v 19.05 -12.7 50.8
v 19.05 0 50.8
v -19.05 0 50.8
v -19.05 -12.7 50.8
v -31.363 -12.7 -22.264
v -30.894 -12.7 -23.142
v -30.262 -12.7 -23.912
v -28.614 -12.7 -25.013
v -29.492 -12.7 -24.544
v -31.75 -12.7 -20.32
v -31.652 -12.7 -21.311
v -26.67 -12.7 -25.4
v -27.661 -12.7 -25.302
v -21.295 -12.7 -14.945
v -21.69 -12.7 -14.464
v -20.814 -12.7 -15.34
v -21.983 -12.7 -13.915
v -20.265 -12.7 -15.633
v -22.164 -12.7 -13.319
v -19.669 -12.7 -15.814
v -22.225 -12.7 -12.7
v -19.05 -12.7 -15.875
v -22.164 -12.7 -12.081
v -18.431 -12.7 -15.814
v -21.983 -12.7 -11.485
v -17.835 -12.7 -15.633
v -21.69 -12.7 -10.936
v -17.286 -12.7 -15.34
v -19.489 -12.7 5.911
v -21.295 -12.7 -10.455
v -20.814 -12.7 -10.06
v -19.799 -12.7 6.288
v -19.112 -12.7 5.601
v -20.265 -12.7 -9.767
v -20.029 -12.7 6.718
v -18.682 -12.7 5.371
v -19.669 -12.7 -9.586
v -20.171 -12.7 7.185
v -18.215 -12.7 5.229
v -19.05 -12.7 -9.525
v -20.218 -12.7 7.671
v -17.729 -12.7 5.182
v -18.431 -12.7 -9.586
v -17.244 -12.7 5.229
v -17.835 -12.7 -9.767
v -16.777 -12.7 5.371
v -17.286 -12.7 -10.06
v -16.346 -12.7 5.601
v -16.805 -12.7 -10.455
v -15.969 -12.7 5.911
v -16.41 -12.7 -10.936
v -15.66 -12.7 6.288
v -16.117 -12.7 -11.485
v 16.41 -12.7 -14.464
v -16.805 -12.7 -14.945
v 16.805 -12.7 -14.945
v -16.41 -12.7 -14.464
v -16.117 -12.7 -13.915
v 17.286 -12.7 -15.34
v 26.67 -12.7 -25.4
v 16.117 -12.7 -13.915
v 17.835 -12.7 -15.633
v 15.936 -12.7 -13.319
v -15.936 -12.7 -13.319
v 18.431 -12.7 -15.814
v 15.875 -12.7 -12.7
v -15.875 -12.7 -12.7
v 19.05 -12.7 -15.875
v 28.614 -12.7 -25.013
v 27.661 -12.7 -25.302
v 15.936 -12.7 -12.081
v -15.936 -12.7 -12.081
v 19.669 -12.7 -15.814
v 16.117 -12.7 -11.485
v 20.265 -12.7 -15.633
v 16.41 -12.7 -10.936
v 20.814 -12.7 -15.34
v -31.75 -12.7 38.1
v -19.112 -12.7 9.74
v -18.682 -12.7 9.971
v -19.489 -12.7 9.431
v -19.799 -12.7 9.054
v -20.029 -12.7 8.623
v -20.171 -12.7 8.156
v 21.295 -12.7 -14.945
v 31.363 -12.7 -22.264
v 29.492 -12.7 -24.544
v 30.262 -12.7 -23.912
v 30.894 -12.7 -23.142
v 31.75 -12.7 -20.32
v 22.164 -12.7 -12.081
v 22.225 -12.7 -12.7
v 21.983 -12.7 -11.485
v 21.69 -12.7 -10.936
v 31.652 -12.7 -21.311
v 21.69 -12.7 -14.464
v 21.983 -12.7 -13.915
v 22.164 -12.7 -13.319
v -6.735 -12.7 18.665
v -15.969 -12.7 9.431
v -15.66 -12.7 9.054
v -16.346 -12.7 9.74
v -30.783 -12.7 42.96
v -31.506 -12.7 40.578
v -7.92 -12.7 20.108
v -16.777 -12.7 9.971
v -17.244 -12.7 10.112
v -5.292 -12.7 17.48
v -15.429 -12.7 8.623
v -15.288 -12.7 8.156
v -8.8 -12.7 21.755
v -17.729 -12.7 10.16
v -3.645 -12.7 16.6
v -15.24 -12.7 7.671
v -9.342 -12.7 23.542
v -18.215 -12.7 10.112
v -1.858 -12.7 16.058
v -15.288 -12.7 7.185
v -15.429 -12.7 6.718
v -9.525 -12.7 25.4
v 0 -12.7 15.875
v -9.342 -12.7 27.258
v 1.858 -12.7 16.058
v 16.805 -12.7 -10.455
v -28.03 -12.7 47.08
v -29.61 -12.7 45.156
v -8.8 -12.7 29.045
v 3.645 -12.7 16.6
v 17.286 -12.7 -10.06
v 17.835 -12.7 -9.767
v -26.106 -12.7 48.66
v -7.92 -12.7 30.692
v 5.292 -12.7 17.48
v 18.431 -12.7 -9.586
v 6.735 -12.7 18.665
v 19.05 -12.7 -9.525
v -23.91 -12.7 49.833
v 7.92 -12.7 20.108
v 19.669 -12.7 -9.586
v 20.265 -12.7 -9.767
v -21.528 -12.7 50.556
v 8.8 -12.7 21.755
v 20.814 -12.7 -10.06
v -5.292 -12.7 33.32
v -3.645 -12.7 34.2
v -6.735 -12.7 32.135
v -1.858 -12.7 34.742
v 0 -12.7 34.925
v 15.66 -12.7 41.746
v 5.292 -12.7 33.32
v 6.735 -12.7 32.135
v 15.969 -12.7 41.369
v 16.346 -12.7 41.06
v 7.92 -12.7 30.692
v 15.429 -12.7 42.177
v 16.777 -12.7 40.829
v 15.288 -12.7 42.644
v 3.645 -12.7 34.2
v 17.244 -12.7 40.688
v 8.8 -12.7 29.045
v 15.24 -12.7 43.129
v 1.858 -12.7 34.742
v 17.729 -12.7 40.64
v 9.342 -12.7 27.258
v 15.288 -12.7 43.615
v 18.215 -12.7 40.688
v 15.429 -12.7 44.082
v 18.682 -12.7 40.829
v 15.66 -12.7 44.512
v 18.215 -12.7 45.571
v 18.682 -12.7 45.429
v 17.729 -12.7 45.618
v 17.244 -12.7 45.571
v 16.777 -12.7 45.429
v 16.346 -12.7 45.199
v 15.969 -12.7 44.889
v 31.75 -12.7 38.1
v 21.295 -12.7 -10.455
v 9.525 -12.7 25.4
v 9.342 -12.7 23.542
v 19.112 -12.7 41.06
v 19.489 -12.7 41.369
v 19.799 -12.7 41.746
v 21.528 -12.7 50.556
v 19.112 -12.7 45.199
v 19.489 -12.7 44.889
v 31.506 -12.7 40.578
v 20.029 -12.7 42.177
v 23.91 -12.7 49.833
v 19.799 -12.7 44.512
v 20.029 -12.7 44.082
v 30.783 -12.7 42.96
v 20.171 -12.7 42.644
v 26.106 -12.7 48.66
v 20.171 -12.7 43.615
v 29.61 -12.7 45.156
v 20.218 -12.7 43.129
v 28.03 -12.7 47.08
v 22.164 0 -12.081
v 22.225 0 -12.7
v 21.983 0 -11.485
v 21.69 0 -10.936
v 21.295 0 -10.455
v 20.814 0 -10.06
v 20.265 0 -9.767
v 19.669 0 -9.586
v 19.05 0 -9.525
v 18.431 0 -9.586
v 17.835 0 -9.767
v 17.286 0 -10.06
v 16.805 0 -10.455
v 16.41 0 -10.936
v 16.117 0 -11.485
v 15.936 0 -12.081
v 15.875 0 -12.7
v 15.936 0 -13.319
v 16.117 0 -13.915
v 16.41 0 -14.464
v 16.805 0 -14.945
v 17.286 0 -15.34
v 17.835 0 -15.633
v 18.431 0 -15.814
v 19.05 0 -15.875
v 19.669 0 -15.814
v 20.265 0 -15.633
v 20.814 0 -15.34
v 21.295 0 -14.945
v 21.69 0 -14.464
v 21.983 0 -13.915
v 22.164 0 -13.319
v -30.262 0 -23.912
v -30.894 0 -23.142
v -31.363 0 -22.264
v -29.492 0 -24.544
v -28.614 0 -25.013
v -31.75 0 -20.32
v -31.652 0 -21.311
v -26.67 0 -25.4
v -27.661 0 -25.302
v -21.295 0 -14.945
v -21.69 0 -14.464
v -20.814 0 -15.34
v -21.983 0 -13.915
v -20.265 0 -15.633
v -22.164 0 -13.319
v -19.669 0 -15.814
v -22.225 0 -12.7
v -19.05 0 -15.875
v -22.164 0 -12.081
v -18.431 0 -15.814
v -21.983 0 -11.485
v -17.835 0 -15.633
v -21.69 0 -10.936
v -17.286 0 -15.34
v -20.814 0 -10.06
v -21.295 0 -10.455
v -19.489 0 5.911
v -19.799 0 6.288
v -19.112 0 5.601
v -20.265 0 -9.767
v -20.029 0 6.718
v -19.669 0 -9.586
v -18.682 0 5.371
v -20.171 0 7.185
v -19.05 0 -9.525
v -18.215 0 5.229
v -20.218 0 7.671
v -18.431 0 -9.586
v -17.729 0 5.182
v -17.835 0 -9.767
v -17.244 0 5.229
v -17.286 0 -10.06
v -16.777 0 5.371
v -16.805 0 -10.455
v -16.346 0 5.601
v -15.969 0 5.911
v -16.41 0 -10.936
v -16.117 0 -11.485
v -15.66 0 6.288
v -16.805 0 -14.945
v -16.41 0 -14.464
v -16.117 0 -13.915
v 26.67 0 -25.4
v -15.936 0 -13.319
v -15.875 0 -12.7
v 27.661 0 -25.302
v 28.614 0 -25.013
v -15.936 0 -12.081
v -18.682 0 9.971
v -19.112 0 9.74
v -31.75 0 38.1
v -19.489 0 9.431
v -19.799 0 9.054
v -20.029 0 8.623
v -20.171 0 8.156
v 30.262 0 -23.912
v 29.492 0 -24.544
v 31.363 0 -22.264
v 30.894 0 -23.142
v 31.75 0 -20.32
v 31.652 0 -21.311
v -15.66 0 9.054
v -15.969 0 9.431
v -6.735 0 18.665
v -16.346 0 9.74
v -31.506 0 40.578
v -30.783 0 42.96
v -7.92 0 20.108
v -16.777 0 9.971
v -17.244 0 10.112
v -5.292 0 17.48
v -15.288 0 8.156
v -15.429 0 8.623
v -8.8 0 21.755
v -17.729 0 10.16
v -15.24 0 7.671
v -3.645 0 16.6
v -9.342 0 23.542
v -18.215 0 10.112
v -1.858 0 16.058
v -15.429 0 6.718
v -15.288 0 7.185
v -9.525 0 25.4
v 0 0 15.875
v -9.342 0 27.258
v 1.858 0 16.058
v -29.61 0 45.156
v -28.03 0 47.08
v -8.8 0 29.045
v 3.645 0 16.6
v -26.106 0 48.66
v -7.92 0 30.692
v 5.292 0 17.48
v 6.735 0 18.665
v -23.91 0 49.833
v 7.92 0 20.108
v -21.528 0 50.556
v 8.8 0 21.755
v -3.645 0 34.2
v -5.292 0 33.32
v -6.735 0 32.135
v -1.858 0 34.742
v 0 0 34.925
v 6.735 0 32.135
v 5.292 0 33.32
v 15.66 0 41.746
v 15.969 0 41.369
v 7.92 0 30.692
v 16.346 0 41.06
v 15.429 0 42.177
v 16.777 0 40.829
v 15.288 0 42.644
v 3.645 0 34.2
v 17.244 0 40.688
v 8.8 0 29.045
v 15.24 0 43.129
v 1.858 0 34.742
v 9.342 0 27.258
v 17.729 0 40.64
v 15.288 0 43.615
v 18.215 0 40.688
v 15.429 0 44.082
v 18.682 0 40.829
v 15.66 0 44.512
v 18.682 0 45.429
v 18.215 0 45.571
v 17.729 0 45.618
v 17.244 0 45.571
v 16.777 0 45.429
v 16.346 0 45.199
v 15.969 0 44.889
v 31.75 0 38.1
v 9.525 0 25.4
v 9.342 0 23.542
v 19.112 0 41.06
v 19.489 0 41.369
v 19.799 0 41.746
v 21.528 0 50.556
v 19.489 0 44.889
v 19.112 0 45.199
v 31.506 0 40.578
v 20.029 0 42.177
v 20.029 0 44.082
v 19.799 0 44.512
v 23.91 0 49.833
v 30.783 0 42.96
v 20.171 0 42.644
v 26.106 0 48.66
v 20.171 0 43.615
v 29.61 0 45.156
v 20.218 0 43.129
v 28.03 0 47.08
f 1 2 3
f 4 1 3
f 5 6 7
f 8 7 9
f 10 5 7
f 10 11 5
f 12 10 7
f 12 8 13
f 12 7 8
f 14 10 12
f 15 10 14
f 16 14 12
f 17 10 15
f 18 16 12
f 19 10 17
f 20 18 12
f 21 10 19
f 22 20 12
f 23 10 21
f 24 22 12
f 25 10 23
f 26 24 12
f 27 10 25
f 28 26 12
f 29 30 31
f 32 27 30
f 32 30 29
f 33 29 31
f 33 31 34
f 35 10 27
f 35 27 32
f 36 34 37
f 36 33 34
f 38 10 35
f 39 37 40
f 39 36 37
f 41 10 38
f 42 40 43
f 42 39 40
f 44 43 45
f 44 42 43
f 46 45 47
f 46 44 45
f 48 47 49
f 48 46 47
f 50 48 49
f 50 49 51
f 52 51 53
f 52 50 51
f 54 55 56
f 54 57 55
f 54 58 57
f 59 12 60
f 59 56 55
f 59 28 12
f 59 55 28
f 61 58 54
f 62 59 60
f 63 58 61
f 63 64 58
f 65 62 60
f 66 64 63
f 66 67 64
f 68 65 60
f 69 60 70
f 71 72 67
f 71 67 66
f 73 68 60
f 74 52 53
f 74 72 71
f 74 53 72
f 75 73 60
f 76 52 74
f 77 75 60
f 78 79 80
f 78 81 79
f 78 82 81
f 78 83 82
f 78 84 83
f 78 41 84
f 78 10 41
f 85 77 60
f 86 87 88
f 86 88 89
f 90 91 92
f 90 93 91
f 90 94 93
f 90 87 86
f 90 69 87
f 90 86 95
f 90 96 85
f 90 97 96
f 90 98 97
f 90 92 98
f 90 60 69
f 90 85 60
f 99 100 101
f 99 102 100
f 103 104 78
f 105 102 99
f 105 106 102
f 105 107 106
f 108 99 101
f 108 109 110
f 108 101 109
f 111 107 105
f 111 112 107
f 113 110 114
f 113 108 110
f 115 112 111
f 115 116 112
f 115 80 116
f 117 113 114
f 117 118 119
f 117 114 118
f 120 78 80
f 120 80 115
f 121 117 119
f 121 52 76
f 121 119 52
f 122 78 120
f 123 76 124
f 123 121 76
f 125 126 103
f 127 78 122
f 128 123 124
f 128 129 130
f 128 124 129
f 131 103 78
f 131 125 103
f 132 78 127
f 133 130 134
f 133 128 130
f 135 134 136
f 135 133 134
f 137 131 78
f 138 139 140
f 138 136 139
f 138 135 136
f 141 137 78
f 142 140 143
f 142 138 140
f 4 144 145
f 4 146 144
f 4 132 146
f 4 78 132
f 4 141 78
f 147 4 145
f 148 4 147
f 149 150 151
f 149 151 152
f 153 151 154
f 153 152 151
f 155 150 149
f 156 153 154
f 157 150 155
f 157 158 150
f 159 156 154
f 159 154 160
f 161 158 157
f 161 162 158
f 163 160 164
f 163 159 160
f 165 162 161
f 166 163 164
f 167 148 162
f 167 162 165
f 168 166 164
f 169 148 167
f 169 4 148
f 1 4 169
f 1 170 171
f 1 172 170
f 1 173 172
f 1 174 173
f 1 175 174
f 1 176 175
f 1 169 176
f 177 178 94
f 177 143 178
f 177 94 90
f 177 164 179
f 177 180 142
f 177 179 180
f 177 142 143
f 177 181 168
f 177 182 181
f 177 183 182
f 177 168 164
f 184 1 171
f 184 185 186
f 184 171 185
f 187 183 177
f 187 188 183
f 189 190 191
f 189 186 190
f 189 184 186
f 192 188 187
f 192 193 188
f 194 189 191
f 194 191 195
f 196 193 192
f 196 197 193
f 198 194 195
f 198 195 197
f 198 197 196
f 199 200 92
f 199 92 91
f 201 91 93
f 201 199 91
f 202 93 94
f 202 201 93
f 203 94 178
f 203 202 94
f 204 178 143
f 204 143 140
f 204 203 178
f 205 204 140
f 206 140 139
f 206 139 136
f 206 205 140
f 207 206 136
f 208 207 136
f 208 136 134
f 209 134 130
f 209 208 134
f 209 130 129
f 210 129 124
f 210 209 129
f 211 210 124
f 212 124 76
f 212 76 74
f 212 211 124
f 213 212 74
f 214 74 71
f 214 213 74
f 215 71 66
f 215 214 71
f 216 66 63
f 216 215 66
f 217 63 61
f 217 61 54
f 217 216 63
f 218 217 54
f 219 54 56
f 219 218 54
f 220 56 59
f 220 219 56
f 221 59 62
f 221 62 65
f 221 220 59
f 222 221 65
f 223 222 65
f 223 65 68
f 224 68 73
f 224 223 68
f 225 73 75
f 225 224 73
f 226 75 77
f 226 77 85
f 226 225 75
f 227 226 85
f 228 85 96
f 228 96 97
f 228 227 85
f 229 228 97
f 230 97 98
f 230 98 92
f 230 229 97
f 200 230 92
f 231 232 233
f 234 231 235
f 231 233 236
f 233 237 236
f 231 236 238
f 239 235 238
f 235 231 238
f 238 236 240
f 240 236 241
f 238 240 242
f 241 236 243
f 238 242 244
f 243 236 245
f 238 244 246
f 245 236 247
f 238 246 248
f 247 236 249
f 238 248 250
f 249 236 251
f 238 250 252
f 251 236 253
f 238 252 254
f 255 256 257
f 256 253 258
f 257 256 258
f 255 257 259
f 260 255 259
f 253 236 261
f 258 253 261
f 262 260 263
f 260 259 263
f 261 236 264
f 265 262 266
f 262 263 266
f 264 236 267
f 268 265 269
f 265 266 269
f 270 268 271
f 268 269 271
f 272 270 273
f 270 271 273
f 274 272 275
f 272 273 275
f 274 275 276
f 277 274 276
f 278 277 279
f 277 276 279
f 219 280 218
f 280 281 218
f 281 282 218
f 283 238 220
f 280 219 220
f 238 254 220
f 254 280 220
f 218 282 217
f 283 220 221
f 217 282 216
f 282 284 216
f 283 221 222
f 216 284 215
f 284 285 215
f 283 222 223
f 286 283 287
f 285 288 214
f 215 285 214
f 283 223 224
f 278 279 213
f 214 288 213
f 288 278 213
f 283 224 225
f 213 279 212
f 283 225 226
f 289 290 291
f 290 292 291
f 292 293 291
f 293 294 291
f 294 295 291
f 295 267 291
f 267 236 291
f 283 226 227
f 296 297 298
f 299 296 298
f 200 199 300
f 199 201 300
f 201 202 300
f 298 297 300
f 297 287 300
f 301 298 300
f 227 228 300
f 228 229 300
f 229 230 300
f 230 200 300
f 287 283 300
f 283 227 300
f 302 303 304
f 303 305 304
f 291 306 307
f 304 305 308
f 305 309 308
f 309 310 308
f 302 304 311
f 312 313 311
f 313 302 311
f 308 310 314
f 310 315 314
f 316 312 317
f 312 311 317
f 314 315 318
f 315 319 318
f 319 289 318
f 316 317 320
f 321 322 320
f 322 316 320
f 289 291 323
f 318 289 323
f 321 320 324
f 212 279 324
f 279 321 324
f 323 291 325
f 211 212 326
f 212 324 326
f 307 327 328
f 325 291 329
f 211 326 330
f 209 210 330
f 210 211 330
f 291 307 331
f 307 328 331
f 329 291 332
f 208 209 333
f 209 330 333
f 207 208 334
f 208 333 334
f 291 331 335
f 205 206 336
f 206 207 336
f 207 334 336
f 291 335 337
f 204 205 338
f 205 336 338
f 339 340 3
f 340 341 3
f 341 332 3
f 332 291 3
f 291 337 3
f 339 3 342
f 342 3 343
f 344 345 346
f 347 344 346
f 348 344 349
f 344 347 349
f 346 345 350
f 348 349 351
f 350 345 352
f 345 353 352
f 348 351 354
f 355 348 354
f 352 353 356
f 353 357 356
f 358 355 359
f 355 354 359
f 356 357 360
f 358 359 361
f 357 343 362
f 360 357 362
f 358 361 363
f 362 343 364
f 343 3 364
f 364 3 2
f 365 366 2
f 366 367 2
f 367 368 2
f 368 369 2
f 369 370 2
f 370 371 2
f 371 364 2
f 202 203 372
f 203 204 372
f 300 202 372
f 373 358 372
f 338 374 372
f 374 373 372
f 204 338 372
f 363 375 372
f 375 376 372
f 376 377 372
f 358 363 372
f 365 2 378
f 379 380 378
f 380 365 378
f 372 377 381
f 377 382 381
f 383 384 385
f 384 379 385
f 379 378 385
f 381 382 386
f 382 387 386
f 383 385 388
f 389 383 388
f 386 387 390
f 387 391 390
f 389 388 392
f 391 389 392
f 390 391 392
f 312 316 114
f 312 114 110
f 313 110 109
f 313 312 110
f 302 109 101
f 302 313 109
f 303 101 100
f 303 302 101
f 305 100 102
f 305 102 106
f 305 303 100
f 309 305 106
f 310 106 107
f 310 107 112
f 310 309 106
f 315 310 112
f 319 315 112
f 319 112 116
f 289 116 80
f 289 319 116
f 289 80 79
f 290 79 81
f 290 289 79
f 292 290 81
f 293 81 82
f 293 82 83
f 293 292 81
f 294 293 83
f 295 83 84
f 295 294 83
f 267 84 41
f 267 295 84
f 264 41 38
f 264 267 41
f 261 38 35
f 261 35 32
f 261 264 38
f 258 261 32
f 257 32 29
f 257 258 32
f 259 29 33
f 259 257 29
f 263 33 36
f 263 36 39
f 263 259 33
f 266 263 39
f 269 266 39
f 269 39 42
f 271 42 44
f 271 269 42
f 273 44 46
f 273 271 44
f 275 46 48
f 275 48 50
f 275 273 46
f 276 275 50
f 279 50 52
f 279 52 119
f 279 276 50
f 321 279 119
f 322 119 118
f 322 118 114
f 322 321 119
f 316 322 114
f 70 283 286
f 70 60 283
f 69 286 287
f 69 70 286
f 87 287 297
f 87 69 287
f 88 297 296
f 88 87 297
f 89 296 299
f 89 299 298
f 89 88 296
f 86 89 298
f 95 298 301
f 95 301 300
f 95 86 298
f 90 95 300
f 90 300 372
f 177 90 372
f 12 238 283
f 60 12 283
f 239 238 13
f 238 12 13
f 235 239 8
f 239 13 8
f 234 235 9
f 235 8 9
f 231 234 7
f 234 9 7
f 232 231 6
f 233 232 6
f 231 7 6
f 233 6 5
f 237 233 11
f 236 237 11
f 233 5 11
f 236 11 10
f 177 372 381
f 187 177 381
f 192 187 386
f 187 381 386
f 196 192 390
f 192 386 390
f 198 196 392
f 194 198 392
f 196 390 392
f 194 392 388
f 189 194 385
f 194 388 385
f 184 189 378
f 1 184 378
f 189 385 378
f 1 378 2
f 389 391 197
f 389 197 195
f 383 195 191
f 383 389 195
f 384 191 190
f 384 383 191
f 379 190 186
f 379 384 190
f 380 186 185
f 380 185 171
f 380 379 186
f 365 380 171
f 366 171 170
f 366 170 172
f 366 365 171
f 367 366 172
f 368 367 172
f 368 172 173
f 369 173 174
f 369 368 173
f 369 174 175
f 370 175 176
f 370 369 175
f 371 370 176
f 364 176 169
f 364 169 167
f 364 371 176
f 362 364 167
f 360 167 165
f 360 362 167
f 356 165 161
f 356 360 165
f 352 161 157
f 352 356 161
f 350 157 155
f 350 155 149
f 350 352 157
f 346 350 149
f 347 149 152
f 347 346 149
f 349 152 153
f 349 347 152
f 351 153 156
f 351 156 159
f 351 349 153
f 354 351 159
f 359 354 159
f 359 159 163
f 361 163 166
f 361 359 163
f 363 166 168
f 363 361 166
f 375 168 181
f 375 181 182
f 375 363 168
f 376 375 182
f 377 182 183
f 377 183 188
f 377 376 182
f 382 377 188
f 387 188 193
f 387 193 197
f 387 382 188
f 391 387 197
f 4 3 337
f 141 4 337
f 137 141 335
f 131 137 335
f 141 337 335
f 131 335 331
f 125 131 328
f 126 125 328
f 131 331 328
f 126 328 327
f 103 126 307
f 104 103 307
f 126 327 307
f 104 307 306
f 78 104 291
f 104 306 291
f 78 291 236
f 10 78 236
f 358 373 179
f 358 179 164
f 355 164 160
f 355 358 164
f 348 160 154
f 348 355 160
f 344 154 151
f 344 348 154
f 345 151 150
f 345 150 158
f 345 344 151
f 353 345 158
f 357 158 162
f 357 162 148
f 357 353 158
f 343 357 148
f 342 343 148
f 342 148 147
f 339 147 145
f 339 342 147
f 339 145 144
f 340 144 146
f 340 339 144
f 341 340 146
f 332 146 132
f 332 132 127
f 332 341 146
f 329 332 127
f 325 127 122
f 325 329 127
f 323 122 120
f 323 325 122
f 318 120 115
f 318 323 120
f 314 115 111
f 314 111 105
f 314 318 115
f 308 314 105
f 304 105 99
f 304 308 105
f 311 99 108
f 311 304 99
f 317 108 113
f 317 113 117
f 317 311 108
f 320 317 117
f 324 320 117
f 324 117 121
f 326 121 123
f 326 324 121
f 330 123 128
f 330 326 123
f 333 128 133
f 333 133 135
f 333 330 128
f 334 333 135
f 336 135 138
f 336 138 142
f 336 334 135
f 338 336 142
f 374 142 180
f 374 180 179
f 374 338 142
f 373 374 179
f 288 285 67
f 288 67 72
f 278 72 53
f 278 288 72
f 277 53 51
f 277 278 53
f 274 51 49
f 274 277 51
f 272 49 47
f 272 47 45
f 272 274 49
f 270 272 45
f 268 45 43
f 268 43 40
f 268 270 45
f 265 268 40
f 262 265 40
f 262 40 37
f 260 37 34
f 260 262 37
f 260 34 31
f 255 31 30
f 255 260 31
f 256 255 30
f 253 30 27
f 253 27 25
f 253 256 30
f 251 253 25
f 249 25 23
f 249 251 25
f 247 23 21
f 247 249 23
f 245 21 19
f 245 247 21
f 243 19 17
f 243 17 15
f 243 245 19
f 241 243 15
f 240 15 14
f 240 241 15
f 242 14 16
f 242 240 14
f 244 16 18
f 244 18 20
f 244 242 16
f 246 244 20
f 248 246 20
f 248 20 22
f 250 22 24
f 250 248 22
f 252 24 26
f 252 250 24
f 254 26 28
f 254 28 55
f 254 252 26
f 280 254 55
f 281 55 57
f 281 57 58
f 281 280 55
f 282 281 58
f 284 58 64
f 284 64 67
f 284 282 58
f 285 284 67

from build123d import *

# Parameters (mm, degrees)
F0_R     = 3.175
F0_R_2   = 2.4892
F0_R_3   = 9.525
F1_DEPTH = 12.7
F2_R     = 5.08


with BuildPart() as f1:
    # F0 (on Front) → F1 (new body)
    with BuildSketch(Plane.XZ):
        with BuildLine():
            Line((-31.75, -25.4), (31.75, -25.4))
            Line((31.75, -25.4), (31.75, 38.1))
            ThreePointArc((31.75, 38.1), (28.0302561211, 47.0802561211), (19.05, 50.8))
            Line((19.05, 50.8), (-19.05, 50.8))
            ThreePointArc((-19.05, 50.8), (-28.0302561211, 47.0802561211), (-31.75, 38.1))
            Line((-31.75, 38.1), (-31.75, -25.4))
        make_face()
        with Locations((-19.05, -12.7)):
            Circle(F0_R, mode=Mode.SUBTRACT)
        with Locations((-17.7292, 7.6708)):
            Circle(F0_R_2, mode=Mode.SUBTRACT)
        with Locations((19.05, -12.7)):
            Circle(F0_R, mode=Mode.SUBTRACT)
        with Locations((0, 25.4)):
            Circle(F0_R_3, mode=Mode.SUBTRACT)
        with Locations((17.7292, 43.1292)):
            Circle(F0_R_2, mode=Mode.SUBTRACT)
    extrude(amount=F1_DEPTH)

    # F2
    f2_edges = [f1.edges().sort_by_distance(p)[0] for p in [
        (31.75, -6.35, -25.4),
        (-31.75, -6.35, -25.4),
    ]]
    fillet(f2_edges, radius=F2_R)


solid = f1.part
